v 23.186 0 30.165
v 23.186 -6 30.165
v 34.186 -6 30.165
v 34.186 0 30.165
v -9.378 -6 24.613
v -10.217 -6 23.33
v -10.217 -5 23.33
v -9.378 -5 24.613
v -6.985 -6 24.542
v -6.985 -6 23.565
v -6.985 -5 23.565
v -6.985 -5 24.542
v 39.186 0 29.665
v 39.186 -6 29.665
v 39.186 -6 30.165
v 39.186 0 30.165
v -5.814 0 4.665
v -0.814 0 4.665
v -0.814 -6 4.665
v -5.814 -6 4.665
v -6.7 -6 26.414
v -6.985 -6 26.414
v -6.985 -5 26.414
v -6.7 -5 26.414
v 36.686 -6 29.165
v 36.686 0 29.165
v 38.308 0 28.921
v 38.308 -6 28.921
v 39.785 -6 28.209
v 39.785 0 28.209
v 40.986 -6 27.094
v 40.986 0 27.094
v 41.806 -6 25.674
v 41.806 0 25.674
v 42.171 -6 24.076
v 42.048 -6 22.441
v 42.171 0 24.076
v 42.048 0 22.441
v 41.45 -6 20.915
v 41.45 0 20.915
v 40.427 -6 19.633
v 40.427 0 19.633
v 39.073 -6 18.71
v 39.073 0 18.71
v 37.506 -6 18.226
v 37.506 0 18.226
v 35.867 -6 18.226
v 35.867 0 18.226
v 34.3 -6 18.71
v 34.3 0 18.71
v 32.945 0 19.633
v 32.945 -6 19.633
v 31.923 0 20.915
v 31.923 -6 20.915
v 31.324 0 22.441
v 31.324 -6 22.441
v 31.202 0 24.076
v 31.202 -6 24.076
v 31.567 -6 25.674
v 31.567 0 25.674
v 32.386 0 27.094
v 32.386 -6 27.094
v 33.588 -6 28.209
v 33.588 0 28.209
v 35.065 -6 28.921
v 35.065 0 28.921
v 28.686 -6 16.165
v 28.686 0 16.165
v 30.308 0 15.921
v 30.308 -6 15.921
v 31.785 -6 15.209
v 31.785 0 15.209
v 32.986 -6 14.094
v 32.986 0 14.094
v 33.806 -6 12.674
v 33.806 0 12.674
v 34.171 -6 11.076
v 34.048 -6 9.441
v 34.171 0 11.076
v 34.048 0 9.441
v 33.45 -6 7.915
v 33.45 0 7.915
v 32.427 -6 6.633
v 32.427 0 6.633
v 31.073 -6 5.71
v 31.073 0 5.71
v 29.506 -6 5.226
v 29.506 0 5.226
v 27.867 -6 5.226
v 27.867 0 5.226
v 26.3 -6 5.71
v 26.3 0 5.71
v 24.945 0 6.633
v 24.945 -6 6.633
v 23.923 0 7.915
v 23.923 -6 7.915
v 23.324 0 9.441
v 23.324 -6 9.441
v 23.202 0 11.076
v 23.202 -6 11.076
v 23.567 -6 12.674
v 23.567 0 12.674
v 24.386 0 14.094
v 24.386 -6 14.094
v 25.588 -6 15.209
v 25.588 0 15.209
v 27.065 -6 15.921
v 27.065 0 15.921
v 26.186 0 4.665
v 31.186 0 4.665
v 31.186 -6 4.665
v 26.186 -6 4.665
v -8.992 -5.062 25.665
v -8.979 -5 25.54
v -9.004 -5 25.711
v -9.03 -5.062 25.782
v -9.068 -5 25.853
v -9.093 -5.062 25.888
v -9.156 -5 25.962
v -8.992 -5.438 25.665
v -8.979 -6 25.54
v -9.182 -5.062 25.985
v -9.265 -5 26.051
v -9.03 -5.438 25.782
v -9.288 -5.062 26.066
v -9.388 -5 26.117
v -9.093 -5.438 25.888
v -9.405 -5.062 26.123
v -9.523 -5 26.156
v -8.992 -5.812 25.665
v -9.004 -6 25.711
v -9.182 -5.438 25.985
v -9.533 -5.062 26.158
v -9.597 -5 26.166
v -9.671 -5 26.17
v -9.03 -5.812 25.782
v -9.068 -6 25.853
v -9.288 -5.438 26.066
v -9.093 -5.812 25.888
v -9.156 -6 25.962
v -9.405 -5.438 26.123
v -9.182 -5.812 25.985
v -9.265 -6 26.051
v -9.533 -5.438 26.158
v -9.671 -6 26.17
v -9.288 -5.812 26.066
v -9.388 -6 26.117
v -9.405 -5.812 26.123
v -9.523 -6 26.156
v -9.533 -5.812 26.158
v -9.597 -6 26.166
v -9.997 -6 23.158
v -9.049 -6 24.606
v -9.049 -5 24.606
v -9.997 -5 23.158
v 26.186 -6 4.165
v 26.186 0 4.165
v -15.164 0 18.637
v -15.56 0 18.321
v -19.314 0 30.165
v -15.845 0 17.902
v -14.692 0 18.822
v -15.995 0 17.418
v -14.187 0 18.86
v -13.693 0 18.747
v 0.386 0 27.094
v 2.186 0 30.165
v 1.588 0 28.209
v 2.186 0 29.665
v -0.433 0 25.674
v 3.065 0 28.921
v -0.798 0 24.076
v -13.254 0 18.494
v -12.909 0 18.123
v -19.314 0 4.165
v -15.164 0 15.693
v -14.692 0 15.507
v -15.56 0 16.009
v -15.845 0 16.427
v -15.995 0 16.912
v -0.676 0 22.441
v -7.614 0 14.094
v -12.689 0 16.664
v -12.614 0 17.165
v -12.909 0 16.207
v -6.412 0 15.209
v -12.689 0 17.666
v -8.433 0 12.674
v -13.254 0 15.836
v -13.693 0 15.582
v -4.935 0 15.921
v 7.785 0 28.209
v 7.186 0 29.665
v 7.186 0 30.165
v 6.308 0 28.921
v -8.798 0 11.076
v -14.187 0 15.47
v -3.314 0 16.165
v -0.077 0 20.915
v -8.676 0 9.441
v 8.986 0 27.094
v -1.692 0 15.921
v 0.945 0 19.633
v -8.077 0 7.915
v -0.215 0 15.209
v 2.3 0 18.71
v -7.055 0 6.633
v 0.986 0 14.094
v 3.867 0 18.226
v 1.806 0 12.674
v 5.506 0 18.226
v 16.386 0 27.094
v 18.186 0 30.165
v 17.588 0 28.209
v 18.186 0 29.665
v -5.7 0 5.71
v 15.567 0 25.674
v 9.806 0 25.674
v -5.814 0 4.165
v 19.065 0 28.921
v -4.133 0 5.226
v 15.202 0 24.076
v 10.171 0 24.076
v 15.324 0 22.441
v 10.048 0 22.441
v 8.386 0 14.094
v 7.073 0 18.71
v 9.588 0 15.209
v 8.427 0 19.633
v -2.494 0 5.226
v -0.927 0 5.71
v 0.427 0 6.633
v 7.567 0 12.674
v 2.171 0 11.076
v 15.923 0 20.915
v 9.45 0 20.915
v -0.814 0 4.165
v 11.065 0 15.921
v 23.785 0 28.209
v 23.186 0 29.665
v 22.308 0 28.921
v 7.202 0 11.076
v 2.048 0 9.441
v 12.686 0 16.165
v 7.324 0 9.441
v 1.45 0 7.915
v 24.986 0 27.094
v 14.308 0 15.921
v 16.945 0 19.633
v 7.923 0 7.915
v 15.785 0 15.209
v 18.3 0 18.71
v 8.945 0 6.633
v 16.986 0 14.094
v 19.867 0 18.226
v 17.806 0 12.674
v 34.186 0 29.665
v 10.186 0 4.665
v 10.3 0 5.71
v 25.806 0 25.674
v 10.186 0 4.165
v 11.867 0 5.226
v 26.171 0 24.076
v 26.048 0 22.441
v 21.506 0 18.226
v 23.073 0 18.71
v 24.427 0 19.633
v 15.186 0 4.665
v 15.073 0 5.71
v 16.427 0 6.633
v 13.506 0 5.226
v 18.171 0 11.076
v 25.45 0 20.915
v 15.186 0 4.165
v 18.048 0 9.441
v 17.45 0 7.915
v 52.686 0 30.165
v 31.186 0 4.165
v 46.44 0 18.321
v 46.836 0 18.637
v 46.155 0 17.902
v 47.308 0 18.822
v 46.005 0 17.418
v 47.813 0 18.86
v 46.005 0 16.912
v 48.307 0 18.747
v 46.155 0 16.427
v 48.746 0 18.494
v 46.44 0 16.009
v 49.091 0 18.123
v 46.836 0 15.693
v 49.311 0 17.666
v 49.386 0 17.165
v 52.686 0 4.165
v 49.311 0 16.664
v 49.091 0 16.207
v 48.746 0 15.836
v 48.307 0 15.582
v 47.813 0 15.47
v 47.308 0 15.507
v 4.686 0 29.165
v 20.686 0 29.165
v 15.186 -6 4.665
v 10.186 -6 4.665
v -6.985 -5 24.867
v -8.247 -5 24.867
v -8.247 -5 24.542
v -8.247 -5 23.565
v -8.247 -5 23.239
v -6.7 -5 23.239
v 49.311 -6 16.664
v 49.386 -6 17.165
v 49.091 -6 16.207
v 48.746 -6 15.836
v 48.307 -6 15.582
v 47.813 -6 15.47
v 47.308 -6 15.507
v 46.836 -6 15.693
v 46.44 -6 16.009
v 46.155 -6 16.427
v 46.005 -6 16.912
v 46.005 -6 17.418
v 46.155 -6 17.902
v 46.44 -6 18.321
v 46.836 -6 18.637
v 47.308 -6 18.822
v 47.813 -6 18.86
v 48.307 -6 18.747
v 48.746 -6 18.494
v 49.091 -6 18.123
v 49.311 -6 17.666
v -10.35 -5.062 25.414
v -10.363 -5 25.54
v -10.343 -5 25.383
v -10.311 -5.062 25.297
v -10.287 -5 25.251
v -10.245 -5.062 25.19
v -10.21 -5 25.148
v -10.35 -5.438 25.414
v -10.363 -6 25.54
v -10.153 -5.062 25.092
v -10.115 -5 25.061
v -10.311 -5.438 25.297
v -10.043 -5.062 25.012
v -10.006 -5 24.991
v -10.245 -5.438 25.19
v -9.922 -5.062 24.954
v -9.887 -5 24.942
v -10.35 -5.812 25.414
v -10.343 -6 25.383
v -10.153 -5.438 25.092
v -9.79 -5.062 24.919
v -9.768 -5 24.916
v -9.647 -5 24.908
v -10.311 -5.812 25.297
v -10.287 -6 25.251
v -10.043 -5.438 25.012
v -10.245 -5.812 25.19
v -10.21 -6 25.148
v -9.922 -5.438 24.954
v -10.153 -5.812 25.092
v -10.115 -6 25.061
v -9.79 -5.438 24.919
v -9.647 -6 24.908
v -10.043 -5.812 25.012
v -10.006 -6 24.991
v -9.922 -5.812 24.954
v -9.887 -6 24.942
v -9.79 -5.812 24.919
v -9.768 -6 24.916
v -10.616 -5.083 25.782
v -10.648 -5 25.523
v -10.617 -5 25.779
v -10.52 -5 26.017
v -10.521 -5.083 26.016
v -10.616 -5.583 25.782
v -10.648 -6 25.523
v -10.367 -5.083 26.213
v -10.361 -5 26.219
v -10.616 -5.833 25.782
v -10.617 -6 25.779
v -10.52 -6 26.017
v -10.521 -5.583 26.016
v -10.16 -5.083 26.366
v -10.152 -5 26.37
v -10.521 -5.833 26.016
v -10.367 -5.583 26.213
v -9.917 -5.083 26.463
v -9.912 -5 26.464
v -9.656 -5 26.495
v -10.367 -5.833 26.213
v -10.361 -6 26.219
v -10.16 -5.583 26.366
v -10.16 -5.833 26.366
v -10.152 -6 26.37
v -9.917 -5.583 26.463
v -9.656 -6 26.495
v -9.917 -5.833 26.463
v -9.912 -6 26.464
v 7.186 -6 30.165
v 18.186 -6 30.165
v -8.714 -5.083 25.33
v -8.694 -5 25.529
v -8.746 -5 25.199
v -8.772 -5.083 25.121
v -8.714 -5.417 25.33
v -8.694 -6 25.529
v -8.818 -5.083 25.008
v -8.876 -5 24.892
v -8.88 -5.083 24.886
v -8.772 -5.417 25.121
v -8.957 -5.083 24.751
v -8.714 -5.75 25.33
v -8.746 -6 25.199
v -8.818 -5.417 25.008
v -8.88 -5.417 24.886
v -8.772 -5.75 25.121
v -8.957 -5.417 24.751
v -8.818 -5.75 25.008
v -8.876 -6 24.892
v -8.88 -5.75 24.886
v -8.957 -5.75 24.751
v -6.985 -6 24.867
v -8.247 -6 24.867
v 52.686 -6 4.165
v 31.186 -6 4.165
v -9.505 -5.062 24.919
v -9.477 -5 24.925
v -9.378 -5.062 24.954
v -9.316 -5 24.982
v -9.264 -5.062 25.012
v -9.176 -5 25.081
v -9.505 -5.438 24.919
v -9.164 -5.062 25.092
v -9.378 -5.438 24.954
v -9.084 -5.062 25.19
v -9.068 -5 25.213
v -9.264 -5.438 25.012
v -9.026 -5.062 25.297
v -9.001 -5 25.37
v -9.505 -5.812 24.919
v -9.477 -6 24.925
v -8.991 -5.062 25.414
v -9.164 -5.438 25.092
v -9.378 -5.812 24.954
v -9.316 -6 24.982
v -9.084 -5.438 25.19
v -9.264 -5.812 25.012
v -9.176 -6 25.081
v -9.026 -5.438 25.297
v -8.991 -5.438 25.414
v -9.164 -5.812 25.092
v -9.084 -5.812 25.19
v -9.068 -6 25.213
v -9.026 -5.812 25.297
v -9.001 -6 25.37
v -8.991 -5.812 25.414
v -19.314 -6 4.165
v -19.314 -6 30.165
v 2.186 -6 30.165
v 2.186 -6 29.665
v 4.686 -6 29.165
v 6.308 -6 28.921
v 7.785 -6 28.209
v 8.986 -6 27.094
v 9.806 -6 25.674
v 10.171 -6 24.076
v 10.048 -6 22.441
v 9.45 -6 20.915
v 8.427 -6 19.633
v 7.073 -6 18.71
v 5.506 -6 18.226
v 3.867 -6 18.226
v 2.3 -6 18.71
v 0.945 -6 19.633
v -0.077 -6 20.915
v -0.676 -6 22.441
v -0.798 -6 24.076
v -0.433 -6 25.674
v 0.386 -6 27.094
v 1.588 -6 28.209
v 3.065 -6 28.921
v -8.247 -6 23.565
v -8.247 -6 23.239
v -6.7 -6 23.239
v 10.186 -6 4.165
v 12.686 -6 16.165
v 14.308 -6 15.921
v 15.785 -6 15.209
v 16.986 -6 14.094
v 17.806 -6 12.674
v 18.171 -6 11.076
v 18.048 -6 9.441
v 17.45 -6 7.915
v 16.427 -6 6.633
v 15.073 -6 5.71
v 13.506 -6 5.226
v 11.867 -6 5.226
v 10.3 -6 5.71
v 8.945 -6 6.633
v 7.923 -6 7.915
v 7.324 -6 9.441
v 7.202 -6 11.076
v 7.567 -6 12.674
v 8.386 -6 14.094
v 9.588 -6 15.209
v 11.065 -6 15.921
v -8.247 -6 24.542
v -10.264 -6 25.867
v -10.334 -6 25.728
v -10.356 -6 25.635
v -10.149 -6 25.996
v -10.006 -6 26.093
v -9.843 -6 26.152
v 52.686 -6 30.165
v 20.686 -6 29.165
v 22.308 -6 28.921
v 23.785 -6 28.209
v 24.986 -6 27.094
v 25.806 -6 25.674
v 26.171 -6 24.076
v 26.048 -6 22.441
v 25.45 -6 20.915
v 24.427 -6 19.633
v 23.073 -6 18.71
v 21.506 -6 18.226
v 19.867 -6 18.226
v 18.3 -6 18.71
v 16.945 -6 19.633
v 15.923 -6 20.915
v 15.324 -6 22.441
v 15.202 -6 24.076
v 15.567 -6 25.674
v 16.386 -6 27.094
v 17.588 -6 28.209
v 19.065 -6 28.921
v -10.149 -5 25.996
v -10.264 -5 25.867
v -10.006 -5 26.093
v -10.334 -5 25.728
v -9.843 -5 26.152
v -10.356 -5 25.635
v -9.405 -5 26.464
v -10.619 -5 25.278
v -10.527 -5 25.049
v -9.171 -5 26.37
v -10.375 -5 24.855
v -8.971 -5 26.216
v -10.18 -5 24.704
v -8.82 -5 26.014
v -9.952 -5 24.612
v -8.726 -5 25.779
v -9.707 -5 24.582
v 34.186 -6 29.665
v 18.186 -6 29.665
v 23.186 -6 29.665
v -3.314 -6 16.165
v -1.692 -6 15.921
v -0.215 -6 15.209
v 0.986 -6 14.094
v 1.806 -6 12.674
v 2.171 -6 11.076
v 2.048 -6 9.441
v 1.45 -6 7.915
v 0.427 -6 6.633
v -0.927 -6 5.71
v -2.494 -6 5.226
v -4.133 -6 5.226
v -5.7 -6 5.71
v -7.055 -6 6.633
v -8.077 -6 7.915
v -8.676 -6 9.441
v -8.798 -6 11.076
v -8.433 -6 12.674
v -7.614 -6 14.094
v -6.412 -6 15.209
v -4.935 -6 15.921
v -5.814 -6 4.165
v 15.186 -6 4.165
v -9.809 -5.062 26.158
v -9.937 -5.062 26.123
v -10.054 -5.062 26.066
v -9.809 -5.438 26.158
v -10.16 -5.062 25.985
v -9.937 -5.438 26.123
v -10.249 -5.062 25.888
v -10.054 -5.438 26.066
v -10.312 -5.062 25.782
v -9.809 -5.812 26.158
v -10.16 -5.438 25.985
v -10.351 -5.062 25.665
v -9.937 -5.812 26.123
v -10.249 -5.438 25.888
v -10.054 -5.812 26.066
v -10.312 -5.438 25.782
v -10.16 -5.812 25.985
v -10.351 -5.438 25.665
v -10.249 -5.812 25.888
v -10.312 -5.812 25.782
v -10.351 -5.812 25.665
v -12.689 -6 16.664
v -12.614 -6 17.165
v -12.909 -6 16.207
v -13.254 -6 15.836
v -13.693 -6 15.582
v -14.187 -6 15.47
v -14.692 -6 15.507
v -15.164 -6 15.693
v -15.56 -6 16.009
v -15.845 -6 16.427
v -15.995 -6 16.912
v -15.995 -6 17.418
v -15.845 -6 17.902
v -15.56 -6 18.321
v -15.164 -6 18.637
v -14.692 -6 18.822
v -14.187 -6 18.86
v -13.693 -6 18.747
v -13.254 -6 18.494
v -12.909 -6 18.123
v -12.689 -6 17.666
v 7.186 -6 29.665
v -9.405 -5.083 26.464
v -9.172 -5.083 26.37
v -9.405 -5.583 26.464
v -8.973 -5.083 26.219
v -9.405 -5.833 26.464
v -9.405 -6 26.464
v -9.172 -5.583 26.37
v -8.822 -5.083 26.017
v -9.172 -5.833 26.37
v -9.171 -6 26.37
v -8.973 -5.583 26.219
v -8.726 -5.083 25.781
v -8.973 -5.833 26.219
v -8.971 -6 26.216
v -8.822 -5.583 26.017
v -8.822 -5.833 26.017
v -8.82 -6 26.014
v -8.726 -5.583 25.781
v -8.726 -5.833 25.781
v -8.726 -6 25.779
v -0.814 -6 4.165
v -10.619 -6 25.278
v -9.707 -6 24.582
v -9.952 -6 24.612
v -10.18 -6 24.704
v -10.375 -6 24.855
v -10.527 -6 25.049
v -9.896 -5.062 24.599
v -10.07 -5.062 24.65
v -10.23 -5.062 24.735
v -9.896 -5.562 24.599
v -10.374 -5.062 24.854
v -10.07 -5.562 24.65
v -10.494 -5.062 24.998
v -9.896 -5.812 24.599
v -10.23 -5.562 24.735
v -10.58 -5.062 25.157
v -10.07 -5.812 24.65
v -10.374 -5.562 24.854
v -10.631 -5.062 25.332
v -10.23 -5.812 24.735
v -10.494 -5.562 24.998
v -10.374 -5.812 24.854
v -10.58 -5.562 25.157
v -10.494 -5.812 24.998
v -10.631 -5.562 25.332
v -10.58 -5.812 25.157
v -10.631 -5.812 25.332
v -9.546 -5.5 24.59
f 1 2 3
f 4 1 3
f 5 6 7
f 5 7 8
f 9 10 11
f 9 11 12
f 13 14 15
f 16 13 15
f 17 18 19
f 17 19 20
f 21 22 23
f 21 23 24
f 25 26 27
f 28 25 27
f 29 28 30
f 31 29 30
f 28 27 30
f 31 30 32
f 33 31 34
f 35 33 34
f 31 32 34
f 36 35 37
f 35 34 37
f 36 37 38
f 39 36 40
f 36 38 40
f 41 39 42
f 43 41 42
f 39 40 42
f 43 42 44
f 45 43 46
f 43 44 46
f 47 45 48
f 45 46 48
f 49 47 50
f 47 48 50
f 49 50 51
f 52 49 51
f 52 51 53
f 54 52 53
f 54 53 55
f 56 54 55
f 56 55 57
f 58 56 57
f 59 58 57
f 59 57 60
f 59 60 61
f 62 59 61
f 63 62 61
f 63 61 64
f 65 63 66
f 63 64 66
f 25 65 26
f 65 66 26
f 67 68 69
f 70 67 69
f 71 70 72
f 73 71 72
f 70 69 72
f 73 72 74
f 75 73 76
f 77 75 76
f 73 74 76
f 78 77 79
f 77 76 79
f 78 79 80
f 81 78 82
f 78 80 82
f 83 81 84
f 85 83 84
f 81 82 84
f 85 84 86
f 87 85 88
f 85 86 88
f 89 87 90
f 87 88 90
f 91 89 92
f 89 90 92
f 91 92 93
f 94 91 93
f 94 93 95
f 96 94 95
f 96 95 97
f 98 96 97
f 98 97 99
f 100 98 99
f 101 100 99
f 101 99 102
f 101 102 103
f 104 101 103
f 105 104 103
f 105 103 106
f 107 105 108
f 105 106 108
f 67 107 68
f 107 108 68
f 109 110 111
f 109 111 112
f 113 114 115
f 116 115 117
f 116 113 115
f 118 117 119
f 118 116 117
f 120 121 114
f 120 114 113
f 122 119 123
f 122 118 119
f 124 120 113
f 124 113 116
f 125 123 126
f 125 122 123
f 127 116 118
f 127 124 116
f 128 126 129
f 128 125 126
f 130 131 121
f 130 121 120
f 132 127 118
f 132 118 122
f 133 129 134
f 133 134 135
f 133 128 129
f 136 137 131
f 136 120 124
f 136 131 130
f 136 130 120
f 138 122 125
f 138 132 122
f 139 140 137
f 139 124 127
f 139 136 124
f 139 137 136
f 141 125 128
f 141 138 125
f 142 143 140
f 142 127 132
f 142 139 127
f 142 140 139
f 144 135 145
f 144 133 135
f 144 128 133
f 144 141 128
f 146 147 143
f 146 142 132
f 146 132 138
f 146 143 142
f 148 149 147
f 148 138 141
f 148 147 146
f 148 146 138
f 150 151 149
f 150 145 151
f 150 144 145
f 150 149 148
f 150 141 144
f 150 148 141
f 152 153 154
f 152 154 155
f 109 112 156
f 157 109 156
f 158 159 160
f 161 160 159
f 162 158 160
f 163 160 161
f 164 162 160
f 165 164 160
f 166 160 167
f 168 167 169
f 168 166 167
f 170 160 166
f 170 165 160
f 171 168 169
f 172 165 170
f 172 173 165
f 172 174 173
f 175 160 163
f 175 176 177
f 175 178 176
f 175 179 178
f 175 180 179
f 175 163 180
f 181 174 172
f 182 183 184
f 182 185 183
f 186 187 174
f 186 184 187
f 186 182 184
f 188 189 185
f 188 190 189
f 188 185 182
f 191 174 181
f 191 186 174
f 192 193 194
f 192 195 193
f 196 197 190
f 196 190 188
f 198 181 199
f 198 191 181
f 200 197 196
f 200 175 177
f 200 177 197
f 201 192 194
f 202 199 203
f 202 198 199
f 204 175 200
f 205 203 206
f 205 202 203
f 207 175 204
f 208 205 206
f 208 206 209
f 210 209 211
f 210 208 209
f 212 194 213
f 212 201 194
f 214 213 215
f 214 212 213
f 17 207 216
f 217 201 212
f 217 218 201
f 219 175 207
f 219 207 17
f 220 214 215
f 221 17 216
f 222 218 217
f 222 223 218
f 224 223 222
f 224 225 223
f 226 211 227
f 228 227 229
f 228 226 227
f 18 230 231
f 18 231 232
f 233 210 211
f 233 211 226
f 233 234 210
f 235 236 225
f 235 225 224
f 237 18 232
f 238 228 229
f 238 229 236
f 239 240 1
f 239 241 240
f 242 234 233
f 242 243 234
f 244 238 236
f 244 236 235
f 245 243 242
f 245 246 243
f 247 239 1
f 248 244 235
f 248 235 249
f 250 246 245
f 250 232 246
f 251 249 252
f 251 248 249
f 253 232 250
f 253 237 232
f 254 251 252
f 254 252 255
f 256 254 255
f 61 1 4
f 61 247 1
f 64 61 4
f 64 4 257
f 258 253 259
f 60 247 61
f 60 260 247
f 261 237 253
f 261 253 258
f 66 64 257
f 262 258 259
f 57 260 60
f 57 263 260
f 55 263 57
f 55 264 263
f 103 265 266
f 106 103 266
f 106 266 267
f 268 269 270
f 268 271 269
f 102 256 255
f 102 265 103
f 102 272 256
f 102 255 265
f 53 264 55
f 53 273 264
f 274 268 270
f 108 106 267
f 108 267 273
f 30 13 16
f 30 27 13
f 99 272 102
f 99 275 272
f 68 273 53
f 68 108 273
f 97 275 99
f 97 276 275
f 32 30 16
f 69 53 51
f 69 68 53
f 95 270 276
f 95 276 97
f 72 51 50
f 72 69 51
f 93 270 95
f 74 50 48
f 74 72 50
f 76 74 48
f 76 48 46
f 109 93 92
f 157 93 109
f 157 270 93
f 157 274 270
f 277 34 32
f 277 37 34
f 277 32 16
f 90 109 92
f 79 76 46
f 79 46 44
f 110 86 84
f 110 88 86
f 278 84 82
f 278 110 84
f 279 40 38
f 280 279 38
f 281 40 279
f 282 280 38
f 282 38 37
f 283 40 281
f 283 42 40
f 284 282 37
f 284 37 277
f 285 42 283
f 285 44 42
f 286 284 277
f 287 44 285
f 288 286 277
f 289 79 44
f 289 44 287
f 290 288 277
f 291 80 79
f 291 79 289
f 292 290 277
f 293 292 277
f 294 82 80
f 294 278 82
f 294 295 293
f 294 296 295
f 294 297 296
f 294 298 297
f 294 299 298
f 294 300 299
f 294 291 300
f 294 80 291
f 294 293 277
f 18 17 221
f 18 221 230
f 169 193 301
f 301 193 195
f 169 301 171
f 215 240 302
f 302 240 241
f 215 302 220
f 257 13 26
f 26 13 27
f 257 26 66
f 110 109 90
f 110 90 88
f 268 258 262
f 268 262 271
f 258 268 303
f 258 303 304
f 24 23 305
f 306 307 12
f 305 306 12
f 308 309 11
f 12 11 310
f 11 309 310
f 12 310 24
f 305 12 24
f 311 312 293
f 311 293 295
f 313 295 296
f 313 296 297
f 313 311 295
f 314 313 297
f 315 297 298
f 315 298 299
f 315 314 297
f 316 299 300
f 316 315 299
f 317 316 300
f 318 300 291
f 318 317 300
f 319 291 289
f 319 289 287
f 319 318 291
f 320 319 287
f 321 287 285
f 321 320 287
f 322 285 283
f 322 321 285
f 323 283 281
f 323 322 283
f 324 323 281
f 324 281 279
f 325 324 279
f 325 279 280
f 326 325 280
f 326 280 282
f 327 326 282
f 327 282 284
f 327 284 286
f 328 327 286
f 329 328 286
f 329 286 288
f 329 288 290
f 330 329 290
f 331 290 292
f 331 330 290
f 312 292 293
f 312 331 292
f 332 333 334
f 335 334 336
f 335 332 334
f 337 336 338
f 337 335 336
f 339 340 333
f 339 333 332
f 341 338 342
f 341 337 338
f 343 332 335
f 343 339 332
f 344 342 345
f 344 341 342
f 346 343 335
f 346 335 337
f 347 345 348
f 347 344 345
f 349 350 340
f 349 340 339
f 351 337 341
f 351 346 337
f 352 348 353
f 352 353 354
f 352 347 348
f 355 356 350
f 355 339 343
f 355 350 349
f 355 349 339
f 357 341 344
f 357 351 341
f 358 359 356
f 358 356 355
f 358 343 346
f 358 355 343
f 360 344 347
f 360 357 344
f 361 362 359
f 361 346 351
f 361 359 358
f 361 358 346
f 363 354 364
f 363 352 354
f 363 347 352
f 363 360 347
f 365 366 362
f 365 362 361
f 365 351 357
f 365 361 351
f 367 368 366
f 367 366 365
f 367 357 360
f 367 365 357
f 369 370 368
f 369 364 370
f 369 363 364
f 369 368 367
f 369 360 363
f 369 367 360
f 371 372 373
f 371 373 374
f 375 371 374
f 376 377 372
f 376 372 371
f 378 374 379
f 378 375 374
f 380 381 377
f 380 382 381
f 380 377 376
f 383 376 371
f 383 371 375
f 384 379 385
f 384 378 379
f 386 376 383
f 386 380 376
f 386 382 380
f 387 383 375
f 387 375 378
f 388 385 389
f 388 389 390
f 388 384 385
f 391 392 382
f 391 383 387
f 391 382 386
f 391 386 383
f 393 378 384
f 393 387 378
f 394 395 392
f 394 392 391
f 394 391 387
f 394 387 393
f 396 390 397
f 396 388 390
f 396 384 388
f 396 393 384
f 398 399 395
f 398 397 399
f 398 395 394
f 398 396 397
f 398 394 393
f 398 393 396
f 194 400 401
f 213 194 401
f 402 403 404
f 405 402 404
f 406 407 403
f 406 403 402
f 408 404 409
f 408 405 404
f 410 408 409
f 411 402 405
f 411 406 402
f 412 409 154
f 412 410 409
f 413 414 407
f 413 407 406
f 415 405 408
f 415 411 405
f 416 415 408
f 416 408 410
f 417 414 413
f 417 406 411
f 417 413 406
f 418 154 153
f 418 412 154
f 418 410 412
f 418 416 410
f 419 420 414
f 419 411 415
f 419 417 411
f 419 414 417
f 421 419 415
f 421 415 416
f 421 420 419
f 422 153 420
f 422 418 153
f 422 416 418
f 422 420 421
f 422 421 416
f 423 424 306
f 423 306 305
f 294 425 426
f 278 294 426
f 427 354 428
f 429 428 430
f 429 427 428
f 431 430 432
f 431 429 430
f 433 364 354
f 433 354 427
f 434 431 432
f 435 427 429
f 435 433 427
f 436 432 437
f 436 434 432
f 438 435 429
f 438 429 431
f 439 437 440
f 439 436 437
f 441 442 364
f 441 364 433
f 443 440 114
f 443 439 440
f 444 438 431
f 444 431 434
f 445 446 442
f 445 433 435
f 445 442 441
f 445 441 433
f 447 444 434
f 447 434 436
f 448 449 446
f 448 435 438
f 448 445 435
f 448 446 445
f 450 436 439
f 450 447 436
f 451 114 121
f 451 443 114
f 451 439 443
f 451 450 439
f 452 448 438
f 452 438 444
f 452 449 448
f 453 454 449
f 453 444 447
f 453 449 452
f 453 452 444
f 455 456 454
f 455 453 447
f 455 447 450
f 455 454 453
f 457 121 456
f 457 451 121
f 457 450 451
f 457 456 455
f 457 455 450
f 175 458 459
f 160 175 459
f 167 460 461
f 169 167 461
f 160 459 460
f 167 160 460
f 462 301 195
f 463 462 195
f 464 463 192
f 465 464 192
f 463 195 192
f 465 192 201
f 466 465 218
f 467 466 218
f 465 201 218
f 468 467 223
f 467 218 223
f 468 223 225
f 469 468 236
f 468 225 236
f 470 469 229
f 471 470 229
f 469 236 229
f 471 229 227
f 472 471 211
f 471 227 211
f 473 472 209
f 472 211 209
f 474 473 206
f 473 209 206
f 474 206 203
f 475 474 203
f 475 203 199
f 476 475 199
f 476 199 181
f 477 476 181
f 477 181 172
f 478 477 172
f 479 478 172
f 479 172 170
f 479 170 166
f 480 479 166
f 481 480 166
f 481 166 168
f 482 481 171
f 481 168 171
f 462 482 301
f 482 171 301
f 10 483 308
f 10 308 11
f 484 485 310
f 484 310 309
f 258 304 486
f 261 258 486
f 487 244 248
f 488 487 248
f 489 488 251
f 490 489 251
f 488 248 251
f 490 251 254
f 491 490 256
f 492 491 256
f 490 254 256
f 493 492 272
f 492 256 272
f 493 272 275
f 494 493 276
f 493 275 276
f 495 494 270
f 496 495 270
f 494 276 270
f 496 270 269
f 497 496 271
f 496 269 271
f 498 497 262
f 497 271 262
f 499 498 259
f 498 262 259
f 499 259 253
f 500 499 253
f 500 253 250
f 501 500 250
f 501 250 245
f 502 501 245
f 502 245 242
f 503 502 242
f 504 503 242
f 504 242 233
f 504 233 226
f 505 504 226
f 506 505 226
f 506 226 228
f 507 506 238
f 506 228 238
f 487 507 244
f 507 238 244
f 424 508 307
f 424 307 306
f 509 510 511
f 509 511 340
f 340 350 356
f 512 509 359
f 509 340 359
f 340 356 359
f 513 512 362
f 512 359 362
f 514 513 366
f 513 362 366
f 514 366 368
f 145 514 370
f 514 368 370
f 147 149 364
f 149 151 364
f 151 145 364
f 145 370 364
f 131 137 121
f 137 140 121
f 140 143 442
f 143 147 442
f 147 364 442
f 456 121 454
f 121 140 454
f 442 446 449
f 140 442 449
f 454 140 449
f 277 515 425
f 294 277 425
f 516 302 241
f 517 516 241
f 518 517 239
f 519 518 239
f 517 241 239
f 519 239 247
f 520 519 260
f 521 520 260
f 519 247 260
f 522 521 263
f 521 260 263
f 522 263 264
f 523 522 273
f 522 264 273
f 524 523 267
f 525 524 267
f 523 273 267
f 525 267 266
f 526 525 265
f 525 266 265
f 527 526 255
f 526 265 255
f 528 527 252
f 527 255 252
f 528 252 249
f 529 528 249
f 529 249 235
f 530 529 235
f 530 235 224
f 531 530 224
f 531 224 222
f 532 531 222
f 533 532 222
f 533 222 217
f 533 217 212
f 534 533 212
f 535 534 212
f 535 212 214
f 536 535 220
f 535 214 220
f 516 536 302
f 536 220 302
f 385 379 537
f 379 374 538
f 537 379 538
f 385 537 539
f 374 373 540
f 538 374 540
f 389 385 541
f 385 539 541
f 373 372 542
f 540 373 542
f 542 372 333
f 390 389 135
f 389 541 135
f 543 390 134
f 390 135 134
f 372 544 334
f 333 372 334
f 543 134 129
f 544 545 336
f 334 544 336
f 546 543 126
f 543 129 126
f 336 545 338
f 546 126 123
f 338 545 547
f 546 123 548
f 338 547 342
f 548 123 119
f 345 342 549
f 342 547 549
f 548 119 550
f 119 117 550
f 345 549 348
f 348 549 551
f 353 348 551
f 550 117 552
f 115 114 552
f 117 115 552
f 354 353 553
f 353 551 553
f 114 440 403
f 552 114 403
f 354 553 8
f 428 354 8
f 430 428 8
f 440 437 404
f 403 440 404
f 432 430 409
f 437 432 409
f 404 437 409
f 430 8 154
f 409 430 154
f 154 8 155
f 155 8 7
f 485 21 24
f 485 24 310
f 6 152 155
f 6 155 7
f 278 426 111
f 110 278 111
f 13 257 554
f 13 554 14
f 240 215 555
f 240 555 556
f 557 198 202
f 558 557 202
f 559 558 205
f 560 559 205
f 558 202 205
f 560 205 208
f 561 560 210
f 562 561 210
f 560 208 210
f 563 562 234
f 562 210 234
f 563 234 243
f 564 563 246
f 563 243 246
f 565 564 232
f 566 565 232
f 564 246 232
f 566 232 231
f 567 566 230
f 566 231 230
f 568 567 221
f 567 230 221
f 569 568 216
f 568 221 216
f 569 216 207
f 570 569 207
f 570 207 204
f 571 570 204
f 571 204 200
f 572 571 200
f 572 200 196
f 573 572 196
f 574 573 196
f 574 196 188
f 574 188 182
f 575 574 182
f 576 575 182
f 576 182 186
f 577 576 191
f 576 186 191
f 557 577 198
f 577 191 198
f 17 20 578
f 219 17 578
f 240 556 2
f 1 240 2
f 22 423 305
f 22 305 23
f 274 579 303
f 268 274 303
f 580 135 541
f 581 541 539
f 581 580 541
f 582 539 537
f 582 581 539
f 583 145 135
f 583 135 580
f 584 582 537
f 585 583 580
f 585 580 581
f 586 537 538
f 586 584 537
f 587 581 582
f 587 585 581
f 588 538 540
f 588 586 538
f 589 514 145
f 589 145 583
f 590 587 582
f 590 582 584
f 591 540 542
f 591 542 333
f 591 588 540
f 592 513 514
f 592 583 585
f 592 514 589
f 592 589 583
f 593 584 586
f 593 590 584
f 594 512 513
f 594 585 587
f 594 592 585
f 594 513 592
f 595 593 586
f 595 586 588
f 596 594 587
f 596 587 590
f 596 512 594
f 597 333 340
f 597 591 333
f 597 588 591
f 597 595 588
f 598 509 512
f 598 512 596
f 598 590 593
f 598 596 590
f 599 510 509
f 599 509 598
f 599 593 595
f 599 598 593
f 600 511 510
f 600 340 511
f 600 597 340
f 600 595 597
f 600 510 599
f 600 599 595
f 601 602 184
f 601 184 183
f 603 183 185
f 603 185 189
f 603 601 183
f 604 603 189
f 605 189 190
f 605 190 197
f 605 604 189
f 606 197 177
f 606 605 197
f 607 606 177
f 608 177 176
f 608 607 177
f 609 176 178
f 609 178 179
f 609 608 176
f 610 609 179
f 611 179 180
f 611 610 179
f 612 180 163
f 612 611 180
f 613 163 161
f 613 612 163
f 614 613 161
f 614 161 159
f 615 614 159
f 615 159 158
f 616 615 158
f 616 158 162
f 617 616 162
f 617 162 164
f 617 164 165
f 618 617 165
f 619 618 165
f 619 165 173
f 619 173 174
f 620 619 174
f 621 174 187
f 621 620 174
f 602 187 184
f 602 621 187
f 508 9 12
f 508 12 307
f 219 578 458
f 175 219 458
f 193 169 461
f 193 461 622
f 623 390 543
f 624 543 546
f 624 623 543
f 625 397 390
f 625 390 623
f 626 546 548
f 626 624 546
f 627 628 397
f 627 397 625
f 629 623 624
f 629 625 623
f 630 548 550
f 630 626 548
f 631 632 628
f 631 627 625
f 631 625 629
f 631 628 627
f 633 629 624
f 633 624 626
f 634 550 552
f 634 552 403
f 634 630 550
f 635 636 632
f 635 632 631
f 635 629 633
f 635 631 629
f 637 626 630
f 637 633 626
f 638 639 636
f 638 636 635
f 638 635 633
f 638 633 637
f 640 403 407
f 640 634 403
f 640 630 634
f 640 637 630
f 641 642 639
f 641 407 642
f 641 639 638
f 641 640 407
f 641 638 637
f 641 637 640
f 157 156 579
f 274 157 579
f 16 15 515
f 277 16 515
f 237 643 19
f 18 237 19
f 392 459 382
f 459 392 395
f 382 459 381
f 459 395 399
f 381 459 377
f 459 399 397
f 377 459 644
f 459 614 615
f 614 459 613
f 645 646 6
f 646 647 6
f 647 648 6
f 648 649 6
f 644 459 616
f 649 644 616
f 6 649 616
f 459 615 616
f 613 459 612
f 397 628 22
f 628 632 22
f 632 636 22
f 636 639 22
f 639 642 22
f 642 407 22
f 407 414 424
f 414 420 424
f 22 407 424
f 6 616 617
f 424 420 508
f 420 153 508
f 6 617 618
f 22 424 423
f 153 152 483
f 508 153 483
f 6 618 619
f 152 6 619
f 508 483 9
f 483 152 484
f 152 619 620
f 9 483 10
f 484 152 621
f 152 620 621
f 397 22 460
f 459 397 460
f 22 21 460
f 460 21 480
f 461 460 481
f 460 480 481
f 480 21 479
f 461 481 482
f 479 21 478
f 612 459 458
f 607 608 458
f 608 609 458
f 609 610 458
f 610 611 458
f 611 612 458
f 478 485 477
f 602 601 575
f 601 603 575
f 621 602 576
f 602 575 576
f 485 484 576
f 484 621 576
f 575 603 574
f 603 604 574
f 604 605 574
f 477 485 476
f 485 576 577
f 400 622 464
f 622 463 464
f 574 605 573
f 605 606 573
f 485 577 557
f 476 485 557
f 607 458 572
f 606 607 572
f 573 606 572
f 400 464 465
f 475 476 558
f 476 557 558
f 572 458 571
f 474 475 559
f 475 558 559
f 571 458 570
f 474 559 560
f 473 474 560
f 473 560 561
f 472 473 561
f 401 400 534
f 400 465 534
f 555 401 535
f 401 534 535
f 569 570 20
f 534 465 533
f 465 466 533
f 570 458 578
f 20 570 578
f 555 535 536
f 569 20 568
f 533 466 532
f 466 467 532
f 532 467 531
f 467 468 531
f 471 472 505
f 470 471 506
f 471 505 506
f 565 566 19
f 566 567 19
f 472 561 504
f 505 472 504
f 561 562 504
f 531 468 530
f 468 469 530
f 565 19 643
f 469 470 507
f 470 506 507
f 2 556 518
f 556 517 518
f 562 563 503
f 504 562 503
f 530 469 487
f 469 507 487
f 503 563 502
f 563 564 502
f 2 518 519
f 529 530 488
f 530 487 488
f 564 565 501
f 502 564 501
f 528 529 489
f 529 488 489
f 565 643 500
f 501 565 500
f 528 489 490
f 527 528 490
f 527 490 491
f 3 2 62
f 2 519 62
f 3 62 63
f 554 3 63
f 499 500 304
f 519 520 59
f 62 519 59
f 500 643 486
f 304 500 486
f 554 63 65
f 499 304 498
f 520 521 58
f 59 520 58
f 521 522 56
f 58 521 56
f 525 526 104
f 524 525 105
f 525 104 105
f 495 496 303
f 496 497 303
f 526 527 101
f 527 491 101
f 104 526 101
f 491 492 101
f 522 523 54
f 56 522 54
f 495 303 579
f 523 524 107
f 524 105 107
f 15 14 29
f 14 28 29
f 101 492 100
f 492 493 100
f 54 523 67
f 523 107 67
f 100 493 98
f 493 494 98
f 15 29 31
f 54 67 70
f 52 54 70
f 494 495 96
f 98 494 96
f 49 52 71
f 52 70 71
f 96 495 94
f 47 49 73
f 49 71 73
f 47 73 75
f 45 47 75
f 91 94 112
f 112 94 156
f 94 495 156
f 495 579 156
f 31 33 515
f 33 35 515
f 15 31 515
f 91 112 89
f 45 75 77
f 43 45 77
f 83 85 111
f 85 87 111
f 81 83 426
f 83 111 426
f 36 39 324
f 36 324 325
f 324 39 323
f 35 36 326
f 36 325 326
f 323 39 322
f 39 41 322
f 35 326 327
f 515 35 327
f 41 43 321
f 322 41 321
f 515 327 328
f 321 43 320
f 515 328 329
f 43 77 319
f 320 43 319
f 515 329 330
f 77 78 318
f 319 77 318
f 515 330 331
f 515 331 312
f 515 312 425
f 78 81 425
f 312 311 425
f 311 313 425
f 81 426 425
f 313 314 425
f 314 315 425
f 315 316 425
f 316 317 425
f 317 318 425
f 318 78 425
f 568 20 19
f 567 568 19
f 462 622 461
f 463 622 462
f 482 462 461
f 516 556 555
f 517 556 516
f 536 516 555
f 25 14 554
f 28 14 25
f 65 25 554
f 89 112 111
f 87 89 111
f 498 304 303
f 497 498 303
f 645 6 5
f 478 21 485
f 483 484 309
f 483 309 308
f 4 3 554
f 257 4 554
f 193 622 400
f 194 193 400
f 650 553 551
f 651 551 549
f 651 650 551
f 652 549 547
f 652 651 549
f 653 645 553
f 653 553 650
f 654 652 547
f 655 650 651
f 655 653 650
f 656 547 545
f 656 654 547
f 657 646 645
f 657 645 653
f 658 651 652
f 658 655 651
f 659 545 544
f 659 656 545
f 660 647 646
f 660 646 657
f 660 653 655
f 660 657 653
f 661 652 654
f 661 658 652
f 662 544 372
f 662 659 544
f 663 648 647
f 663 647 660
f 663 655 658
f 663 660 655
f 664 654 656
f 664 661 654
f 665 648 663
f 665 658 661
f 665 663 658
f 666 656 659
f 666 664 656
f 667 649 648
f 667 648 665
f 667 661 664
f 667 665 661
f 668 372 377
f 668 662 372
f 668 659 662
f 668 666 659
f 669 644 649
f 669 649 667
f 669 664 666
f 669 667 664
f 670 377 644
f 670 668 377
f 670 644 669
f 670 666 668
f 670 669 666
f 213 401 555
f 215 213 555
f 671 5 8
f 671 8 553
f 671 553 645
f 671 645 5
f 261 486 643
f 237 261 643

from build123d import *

# Parameters (mm, degrees)
SKETCH1_R             = 5.5
BOSS_EXTRUDE1_DEPTH   = 6
BOSS_EXTRUDE1_2_DEPTH = 6
BOSS_EXTRUDE1_3_DEPTH = 6
BOSS_EXTRUDE1_4_DEPTH = 6
BOSS_EXTRUDE1_5_DEPTH = 6
BOSS_EXTRUDE1_6_DEPTH = 6
SKETCH1_3_R           = 1.7
BOSS_EXTRUDE2_DEPTH   = 6
CUT_EXTRUDE1_DEPTH    = 1


with BuildPart() as part:
    # Sketch1 → Boss-Extrude1 (new body)
    with BuildSketch(Plane(origin=(0, 0, 0), x_dir=(1, 0, 0), z_dir=(0, 1, 0))):
        Polygon((2.68639507, -4.66487452), (-9.31360493, -4.664874562), (-9.313604887, -16.664874562), (2.686395113, -16.66487452), align=None)
        with Locations((-3.313604908, -10.664874541)):
            Circle(SKETCH1_R, mode=Mode.SUBTRACT)
    extrude(amount=-BOSS_EXTRUDE1_DEPTH)



with BuildPart() as body_2:
    # Sketch1 → Boss-Extrude1 2 (new body)
    with BuildSketch(Plane(origin=(0, 0, 0), x_dir=(1, 0, 0), z_dir=(0, 1, 0))):
        Polygon((18.68639507, -4.664873819), (6.68639507, -4.664873862), (6.686395113, -16.664873862), (18.686395113, -16.664873819), align=None)
        with Locations((12.686395092, -10.66487384)):
            Circle(SKETCH1_R, mode=Mode.SUBTRACT)
    extrude(amount=-BOSS_EXTRUDE1_2_DEPTH)


with BuildPart() as body_3:
    # Sketch1 → Boss-Extrude1 3 (new body)
    with BuildSketch(Plane(origin=(0, 0, 0), x_dir=(1, 0, 0), z_dir=(0, 1, 0))):
        Polygon((-1.313604837, -29.664873456), (10.686395163, -29.664873413), (10.68639512, -17.664873413), (-1.31360488, -17.664873456), align=None)
        with Locations((4.686395141, -23.664873434)):
            Circle(SKETCH1_R, mode=Mode.SUBTRACT)
    extrude(amount=-BOSS_EXTRUDE1_3_DEPTH)


with BuildPart() as body_4:
    # Sketch1 → Boss-Extrude1 4 (new body)
    with BuildSketch(Plane(origin=(0, 0, 0), x_dir=(1, 0, 0), z_dir=(0, 1, 0))):
        Polygon((14.686395163, -29.664873833), (26.686395163, -29.664873791), (26.68639512, -17.664873791), (14.68639512, -17.664873833), align=None)
        with Locations((20.686395141, -23.664873812)):
            Circle(SKETCH1_R, mode=Mode.SUBTRACT)
    extrude(amount=-BOSS_EXTRUDE1_4_DEPTH)


with BuildPart() as body_5:
    # Sketch1 → Boss-Extrude1 5 (new body)
    with BuildSketch(Plane(origin=(0, 0, 0), x_dir=(1, 0, 0), z_dir=(0, 1, 0))):
        Polygon((34.68639507, -4.664873762), (22.68639507, -4.664873805), (22.686395113, -16.664873805), (34.686395113, -16.664873762), align=None)
        with Locations((28.686395092, -10.664873784)):
            Circle(SKETCH1_R, mode=Mode.SUBTRACT)
    extrude(amount=-BOSS_EXTRUDE1_5_DEPTH)


with BuildPart() as body_6:
    # Sketch1 → Boss-Extrude1 6 (new body)
    with BuildSketch(Plane(origin=(0, 0, 0), x_dir=(1, 0, 0), z_dir=(0, 1, 0))):
        Polygon((30.686395163, -29.664873979), (42.686395163, -29.664873936), (42.68639512, -17.664873936), (30.68639512, -17.664873979), align=None)
        with Locations((36.686395141, -23.664873958)):
            Circle(SKETCH1_R, mode=Mode.SUBTRACT)
    extrude(amount=-BOSS_EXTRUDE1_6_DEPTH)


with BuildPart() as part_1:
    add(part.part)

    add(body_2.part)  # Boss-Extrude2 merges body 2

    add(body_3.part)  # Boss-Extrude2 merges body 3

    add(body_4.part)  # Boss-Extrude2 merges body 4

    add(body_5.part)  # Boss-Extrude2 merges body 5

    add(body_6.part)  # Boss-Extrude2 merges body 6
    # Sketch1<3> → Boss-Extrude2 (add)
    with BuildSketch(Plane(origin=(0, 0, 0), x_dir=(1, 0, 0), z_dir=(0, 1, 0))):
        Polygon((6.186395002, -4.164873846), (3.186395002, -4.1648745), (-0.813604931, -4.164874532), (-0.81360493, -4.664874532), (2.68639507, -4.66487452), (2.686395113, -16.66487452), (-9.313604887, -16.664874562), (-9.31360493, -4.664874562), (-5.81360493, -4.66487455), (-5.813604931, -4.16487455), (-9.813604931, -4.164874564), (-19.313604998, -4.164874546), (-19.313604998, -30.16487344), (-1.813604902, -30.16487344), (2.186395164, -30.164873443), (2.186395163, -29.664873443), (-1.313604837, -29.664873456), (-1.31360488, -17.664873456), (10.68639512, -17.664873413), (10.686395163, -29.664873413), (7.186395163, -29.664873425), (7.186395164, -30.164873425), (11.186395164, -30.164873411), (14.186395098, -30.164873817), (18.186395164, -30.164873821), (18.186395163, -29.664873821), (14.686395163, -29.664873833), (14.68639512, -17.664873833), (26.68639512, -17.664873791), (26.686395163, -29.664873791), (23.186395163, -29.664873803), (23.186395164, -30.164873803), (27.186395164, -30.164873789), (30.186395098, -30.164873963), (34.186395164, -30.164873966), (34.186395163, -29.664873966), (30.686395163, -29.664873979), (30.68639512, -17.664873979), (42.68639512, -17.664873936), (42.686395163, -29.664873936), (39.186395163, -29.664873949), (39.186395164, -30.164873949), (43.186395164, -30.164873935), (52.686395098, -30.16487344), (52.686395098, -4.164874546), (35.186395002, -4.164873743), (31.186395069, -4.164873775), (31.18639507, -4.664873775), (34.68639507, -4.664873762), (34.686395113, -16.664873762), (22.686395113, -16.664873805), (22.68639507, -4.664873805), (26.18639507, -4.664873793), (26.186395069, -4.164873793), (22.186395069, -4.164873807), (19.186395002, -4.1648738), (15.186395069, -4.164873832), (15.18639507, -4.664873832), (18.68639507, -4.664873819), (18.686395113, -16.664873819), (6.686395113, -16.664873862), (6.68639507, -4.664873862), (10.18639507, -4.664873849), (10.186395069, -4.164873849), align=None)
        with Locations((-14.313604998, -17.164873993)):
            Circle(SKETCH1_3_R, mode=Mode.SUBTRACT)
        with Locations((47.686395098, -17.164873993)):
            Circle(SKETCH1_3_R, mode=Mode.SUBTRACT)
    extrude(amount=-BOSS_EXTRUDE2_DEPTH)

    # Sketch2 → Cut-Extrude1 (cut)
    # profile 1 of 2: a face of its own
    with BuildSketch(Plane(origin=(0, -6, 0), x_dir=(-1, 0, 0), z_dir=(0, -1, 0))):
        Polygon((6.699801581, -23.2390136), (8.246596453, -23.2390136), (8.246596453, -23.564654626), (6.984737478, -23.564654626), (6.984737478, -24.541577703), (8.246596453, -24.541577703), (8.246596453, -24.867218728), (6.984737478, -24.867218728), (6.984737478, -26.4140136), (6.699801581, -26.4140136), align=None)
    # profile 2 of 2: a face of its own
    with BuildSketch(Plane(origin=(0, -6, 0), x_dir=(-1, 0, 0), z_dir=(0, -1, 0))):
        with BuildLine():
            Line((9.996916965, -23.157603344), (10.216979065, -23.329964121))
            Line((10.216979065, -23.329964121), (9.378071813, -24.612811677))
            add(Edge.make_bspline(
                [(9.378071813, -24.612811677), (9.43392485, -24.603909103), (9.542872514, -24.586543627), (9.65315015, -24.583678919), (9.706892927, -24.582282831)],
                knots=[0, 0, 0, 0, 1.025318673, 2, 2, 2, 2], degree=3))
            add(Edge.make_bspline(
                [(9.706892927, -24.582282831), (9.739163887, -24.583137599), (9.802478203, -24.584814619), (9.895509725, -24.598067595), (9.984924431, -24.618695779), (10.070522851, -24.64888638), (10.152413619, -24.68743998), (10.231065003, -24.733649384), (10.30499899, -24.789897237), (10.375167554, -24.852730491), (10.438873565, -24.922323744), (10.49527613, -24.996166388), (10.542653291, -25.074181472), (10.581092491, -25.156329486), (10.610941917, -25.2424838), (10.632702138, -25.332534184), (10.645565054, -25.426542733), (10.647311749, -25.490476506), (10.648199017, -25.522952903)],
                knots=[0, 0, 0, 0, 1.044136307, 2.048553127, 3.035567123, 4.010001674, 4.980053131, 5.96154148, 6.956538004, 7.981742224, 9.006487041, 10.005615874, 10.984750588, 11.954802044, 12.935714515, 13.930994945, 14.949008866, 16, 16, 16, 16], degree=3))
            add(Edge.make_bspline(
                [(10.648199017, -25.522952903), (10.646908057, -25.567384491), (10.644367755, -25.654815343), (10.619055025, -25.782157069), (10.579721633, -25.903471565), (10.523499161, -26.016821942), (10.453665142, -26.122052845), (10.368504755, -26.215293946), (10.271038162, -26.298451765), (10.160832281, -26.36799027), (10.042229735, -26.42478018), (9.917631851, -26.465570078), (9.788248654, -26.49068294), (9.700433045, -26.493831272), (9.656011517, -26.495423856)],
                knots=[0, 0, 0, 0, 1.031375318, 2.029502543, 3.004789286, 3.987476834, 4.960371455, 5.9300674, 6.912260825, 7.929083631, 8.949397511, 9.960523116, 10.96833055, 12, 12, 12, 12], degree=3))
            add(Edge.make_bspline(
                [(9.656011517, -26.495423856), (9.613288081, -26.494037555), (9.528660436, -26.491291536), (9.404170686, -26.466829578), (9.284552092, -26.427180992), (9.170642725, -26.372558039), (9.065123312, -26.303562674), (8.970720913, -26.220502607), (8.887906232, -26.125153306), (8.818986397, -26.017529563), (8.764323119, -25.901877958), (8.723329401, -25.781284966), (8.699384238, -25.656189983), (8.69603819, -25.571389235), (8.694352863, -25.528677062)],
                knots=[0, 0, 0, 0, 1.012016664, 2.004627821, 2.994792927, 3.992885782, 4.990978636, 5.973936114, 6.964471063, 7.975201453, 8.993600317, 9.990122807, 10.98767138, 12, 12, 12, 12], degree=3))
            add(Edge.make_bspline(
                [(8.694352863, -25.528677062), (8.695424602, -25.495979475), (8.697612889, -25.429217252), (8.712892251, -25.328103455), (8.737443886, -25.224642831), (8.764939609, -25.136872955), (8.793991413, -25.064971432), (8.818169074, -25.007001837), (8.848262627, -24.947347149), (8.880351337, -24.883961779), (8.91732364, -24.818479279), (8.957524265, -24.749805236), (9.002064662, -24.679031831), (9.033288667, -24.631003882), (9.049250699, -24.606451501)],
                knots=[0, 0, 0, 0, 1.173818275, 2.396712641, 3.66331629, 4.989737886, 5.693666774, 6.447286557, 7.243889047, 8.091586357, 8.998013824, 9.943181721, 10.948533338, 12, 12, 12, 12], degree=3))
            Line((9.049250699, -24.606451501), (9.996916965, -23.157603344))
        make_face()
        with BuildLine():
            add(Edge.make_bspline(
                [(9.64710727, -24.907923856), (9.622921579, -24.908639019), (9.575469451, -24.910042162), (9.505937895, -24.917966716), (9.440309411, -24.932982832), (9.377830069, -24.952402516), (9.31916676, -24.978858553), (9.263592246, -25.010560401), (9.211746157, -25.048541998), (9.16388158, -25.091418934), (9.120507249, -25.138406483), (9.083148796, -25.188723076), (9.050925237, -25.241169384), (9.024725214, -25.296180139), (9.004323526, -25.353735218), (8.989565892, -25.413569669), (8.981352848, -25.476084793), (8.97998648, -25.518477849), (8.97928876, -25.540125379)],
                knots=[0, 0, 0, 0, 1.128956033, 2.215002439, 3.259141796, 4.2666399, 5.263148119, 6.255916712, 7.247353359, 8.256307737, 9.250603402, 10.226115518, 11.176314381, 12.118911324, 13.063945463, 14.021379252, 14.989639887, 16, 16, 16, 16], degree=3))
            add(Edge.make_bspline(
                [(8.97928876, -25.540125379), (8.97985696, -25.561579289), (8.980971114, -25.603647213), (8.991087861, -25.665640612), (9.006541115, -25.725298779), (9.029528474, -25.782314158), (9.056948579, -25.837555818), (9.093148409, -25.889022827), (9.133259351, -25.939841033), (9.181205419, -25.986106654), (9.232661612, -26.029156591), (9.28763556, -26.066785107), (9.344930667, -26.098976136), (9.405320457, -26.124204774), (9.467948134, -26.144909663), (9.533335493, -26.159479719), (9.601528012, -26.167717054), (9.647721485, -26.169085201), (9.67127594, -26.169782831)],
                knots=[0, 0, 0, 0, 0.989467248, 1.94019797, 2.891935182, 3.827694429, 4.772920941, 5.730924762, 6.725747692, 7.756678648, 8.79901574, 9.819492441, 10.826891316, 11.826466727, 12.835195252, 13.867842842, 14.912794438, 16, 16, 16, 16], degree=3))
            add(Edge.make_bspline(
                [(9.67127594, -26.169782831), (9.694830356, -26.169085146), (9.741023753, -26.167716892), (9.809216821, -26.159480335), (9.874602152, -26.144907404), (9.9372372, -26.124212963), (9.997599783, -26.09894576), (10.054844781, -26.066985375), (10.109298837, -26.028925183), (10.16078881, -25.986180223), (10.208535311, -25.939577707), (10.249608271, -25.889476459), (10.28469949, -25.837139854), (10.313214788, -25.782531768), (10.335948959, -25.725264304), (10.351480576, -25.665649848), (10.361576431, -25.603644795), (10.362693456, -25.561578473), (10.363263119, -25.540125379)],
                knots=[0, 0, 0, 0, 1.087397944, 2.132534446, 3.165364764, 4.174271784, 5.174024072, 6.181601208, 7.194203697, 8.236725232, 9.267838612, 10.269026844, 11.221737037, 12.171628256, 13.107553087, 14.05945871, 15.010357665, 16, 16, 16, 16], degree=3))
            add(Edge.make_bspline(
                [(10.363263119, -25.540125379), (10.362763924, -25.518449609), (10.361784167, -25.475907121), (10.350702565, -25.413597625), (10.335333378, -25.35343124), (10.31212604, -25.29578579), (10.28197527, -25.240889945), (10.245252874, -25.18846183), (10.202761835, -25.138117296), (10.153715725, -25.091298499), (10.100325283, -25.048806355), (10.043918117, -25.010417813), (9.98414317, -24.979153645), (9.922078942, -24.95231253), (9.856977887, -24.933290658), (9.789551091, -24.917919833), (9.719159645, -24.910108409), (9.671290808, -24.908657076), (9.64710727, -24.907923856)],
                knots=[0, 0, 0, 0, 0.978753431, 1.920974676, 2.853199117, 3.782215702, 4.721507756, 5.67862441, 6.671401678, 7.694929396, 8.738190014, 9.75360867, 10.774035531, 11.783329636, 12.805060902, 13.835252836, 14.906360638, 16, 16, 16, 16], degree=3))
        make_face(mode=Mode.SUBTRACT)
    extrude(amount=-CUT_EXTRUDE1_DEPTH, mode=Mode.SUBTRACT)


solid = part_1.part
